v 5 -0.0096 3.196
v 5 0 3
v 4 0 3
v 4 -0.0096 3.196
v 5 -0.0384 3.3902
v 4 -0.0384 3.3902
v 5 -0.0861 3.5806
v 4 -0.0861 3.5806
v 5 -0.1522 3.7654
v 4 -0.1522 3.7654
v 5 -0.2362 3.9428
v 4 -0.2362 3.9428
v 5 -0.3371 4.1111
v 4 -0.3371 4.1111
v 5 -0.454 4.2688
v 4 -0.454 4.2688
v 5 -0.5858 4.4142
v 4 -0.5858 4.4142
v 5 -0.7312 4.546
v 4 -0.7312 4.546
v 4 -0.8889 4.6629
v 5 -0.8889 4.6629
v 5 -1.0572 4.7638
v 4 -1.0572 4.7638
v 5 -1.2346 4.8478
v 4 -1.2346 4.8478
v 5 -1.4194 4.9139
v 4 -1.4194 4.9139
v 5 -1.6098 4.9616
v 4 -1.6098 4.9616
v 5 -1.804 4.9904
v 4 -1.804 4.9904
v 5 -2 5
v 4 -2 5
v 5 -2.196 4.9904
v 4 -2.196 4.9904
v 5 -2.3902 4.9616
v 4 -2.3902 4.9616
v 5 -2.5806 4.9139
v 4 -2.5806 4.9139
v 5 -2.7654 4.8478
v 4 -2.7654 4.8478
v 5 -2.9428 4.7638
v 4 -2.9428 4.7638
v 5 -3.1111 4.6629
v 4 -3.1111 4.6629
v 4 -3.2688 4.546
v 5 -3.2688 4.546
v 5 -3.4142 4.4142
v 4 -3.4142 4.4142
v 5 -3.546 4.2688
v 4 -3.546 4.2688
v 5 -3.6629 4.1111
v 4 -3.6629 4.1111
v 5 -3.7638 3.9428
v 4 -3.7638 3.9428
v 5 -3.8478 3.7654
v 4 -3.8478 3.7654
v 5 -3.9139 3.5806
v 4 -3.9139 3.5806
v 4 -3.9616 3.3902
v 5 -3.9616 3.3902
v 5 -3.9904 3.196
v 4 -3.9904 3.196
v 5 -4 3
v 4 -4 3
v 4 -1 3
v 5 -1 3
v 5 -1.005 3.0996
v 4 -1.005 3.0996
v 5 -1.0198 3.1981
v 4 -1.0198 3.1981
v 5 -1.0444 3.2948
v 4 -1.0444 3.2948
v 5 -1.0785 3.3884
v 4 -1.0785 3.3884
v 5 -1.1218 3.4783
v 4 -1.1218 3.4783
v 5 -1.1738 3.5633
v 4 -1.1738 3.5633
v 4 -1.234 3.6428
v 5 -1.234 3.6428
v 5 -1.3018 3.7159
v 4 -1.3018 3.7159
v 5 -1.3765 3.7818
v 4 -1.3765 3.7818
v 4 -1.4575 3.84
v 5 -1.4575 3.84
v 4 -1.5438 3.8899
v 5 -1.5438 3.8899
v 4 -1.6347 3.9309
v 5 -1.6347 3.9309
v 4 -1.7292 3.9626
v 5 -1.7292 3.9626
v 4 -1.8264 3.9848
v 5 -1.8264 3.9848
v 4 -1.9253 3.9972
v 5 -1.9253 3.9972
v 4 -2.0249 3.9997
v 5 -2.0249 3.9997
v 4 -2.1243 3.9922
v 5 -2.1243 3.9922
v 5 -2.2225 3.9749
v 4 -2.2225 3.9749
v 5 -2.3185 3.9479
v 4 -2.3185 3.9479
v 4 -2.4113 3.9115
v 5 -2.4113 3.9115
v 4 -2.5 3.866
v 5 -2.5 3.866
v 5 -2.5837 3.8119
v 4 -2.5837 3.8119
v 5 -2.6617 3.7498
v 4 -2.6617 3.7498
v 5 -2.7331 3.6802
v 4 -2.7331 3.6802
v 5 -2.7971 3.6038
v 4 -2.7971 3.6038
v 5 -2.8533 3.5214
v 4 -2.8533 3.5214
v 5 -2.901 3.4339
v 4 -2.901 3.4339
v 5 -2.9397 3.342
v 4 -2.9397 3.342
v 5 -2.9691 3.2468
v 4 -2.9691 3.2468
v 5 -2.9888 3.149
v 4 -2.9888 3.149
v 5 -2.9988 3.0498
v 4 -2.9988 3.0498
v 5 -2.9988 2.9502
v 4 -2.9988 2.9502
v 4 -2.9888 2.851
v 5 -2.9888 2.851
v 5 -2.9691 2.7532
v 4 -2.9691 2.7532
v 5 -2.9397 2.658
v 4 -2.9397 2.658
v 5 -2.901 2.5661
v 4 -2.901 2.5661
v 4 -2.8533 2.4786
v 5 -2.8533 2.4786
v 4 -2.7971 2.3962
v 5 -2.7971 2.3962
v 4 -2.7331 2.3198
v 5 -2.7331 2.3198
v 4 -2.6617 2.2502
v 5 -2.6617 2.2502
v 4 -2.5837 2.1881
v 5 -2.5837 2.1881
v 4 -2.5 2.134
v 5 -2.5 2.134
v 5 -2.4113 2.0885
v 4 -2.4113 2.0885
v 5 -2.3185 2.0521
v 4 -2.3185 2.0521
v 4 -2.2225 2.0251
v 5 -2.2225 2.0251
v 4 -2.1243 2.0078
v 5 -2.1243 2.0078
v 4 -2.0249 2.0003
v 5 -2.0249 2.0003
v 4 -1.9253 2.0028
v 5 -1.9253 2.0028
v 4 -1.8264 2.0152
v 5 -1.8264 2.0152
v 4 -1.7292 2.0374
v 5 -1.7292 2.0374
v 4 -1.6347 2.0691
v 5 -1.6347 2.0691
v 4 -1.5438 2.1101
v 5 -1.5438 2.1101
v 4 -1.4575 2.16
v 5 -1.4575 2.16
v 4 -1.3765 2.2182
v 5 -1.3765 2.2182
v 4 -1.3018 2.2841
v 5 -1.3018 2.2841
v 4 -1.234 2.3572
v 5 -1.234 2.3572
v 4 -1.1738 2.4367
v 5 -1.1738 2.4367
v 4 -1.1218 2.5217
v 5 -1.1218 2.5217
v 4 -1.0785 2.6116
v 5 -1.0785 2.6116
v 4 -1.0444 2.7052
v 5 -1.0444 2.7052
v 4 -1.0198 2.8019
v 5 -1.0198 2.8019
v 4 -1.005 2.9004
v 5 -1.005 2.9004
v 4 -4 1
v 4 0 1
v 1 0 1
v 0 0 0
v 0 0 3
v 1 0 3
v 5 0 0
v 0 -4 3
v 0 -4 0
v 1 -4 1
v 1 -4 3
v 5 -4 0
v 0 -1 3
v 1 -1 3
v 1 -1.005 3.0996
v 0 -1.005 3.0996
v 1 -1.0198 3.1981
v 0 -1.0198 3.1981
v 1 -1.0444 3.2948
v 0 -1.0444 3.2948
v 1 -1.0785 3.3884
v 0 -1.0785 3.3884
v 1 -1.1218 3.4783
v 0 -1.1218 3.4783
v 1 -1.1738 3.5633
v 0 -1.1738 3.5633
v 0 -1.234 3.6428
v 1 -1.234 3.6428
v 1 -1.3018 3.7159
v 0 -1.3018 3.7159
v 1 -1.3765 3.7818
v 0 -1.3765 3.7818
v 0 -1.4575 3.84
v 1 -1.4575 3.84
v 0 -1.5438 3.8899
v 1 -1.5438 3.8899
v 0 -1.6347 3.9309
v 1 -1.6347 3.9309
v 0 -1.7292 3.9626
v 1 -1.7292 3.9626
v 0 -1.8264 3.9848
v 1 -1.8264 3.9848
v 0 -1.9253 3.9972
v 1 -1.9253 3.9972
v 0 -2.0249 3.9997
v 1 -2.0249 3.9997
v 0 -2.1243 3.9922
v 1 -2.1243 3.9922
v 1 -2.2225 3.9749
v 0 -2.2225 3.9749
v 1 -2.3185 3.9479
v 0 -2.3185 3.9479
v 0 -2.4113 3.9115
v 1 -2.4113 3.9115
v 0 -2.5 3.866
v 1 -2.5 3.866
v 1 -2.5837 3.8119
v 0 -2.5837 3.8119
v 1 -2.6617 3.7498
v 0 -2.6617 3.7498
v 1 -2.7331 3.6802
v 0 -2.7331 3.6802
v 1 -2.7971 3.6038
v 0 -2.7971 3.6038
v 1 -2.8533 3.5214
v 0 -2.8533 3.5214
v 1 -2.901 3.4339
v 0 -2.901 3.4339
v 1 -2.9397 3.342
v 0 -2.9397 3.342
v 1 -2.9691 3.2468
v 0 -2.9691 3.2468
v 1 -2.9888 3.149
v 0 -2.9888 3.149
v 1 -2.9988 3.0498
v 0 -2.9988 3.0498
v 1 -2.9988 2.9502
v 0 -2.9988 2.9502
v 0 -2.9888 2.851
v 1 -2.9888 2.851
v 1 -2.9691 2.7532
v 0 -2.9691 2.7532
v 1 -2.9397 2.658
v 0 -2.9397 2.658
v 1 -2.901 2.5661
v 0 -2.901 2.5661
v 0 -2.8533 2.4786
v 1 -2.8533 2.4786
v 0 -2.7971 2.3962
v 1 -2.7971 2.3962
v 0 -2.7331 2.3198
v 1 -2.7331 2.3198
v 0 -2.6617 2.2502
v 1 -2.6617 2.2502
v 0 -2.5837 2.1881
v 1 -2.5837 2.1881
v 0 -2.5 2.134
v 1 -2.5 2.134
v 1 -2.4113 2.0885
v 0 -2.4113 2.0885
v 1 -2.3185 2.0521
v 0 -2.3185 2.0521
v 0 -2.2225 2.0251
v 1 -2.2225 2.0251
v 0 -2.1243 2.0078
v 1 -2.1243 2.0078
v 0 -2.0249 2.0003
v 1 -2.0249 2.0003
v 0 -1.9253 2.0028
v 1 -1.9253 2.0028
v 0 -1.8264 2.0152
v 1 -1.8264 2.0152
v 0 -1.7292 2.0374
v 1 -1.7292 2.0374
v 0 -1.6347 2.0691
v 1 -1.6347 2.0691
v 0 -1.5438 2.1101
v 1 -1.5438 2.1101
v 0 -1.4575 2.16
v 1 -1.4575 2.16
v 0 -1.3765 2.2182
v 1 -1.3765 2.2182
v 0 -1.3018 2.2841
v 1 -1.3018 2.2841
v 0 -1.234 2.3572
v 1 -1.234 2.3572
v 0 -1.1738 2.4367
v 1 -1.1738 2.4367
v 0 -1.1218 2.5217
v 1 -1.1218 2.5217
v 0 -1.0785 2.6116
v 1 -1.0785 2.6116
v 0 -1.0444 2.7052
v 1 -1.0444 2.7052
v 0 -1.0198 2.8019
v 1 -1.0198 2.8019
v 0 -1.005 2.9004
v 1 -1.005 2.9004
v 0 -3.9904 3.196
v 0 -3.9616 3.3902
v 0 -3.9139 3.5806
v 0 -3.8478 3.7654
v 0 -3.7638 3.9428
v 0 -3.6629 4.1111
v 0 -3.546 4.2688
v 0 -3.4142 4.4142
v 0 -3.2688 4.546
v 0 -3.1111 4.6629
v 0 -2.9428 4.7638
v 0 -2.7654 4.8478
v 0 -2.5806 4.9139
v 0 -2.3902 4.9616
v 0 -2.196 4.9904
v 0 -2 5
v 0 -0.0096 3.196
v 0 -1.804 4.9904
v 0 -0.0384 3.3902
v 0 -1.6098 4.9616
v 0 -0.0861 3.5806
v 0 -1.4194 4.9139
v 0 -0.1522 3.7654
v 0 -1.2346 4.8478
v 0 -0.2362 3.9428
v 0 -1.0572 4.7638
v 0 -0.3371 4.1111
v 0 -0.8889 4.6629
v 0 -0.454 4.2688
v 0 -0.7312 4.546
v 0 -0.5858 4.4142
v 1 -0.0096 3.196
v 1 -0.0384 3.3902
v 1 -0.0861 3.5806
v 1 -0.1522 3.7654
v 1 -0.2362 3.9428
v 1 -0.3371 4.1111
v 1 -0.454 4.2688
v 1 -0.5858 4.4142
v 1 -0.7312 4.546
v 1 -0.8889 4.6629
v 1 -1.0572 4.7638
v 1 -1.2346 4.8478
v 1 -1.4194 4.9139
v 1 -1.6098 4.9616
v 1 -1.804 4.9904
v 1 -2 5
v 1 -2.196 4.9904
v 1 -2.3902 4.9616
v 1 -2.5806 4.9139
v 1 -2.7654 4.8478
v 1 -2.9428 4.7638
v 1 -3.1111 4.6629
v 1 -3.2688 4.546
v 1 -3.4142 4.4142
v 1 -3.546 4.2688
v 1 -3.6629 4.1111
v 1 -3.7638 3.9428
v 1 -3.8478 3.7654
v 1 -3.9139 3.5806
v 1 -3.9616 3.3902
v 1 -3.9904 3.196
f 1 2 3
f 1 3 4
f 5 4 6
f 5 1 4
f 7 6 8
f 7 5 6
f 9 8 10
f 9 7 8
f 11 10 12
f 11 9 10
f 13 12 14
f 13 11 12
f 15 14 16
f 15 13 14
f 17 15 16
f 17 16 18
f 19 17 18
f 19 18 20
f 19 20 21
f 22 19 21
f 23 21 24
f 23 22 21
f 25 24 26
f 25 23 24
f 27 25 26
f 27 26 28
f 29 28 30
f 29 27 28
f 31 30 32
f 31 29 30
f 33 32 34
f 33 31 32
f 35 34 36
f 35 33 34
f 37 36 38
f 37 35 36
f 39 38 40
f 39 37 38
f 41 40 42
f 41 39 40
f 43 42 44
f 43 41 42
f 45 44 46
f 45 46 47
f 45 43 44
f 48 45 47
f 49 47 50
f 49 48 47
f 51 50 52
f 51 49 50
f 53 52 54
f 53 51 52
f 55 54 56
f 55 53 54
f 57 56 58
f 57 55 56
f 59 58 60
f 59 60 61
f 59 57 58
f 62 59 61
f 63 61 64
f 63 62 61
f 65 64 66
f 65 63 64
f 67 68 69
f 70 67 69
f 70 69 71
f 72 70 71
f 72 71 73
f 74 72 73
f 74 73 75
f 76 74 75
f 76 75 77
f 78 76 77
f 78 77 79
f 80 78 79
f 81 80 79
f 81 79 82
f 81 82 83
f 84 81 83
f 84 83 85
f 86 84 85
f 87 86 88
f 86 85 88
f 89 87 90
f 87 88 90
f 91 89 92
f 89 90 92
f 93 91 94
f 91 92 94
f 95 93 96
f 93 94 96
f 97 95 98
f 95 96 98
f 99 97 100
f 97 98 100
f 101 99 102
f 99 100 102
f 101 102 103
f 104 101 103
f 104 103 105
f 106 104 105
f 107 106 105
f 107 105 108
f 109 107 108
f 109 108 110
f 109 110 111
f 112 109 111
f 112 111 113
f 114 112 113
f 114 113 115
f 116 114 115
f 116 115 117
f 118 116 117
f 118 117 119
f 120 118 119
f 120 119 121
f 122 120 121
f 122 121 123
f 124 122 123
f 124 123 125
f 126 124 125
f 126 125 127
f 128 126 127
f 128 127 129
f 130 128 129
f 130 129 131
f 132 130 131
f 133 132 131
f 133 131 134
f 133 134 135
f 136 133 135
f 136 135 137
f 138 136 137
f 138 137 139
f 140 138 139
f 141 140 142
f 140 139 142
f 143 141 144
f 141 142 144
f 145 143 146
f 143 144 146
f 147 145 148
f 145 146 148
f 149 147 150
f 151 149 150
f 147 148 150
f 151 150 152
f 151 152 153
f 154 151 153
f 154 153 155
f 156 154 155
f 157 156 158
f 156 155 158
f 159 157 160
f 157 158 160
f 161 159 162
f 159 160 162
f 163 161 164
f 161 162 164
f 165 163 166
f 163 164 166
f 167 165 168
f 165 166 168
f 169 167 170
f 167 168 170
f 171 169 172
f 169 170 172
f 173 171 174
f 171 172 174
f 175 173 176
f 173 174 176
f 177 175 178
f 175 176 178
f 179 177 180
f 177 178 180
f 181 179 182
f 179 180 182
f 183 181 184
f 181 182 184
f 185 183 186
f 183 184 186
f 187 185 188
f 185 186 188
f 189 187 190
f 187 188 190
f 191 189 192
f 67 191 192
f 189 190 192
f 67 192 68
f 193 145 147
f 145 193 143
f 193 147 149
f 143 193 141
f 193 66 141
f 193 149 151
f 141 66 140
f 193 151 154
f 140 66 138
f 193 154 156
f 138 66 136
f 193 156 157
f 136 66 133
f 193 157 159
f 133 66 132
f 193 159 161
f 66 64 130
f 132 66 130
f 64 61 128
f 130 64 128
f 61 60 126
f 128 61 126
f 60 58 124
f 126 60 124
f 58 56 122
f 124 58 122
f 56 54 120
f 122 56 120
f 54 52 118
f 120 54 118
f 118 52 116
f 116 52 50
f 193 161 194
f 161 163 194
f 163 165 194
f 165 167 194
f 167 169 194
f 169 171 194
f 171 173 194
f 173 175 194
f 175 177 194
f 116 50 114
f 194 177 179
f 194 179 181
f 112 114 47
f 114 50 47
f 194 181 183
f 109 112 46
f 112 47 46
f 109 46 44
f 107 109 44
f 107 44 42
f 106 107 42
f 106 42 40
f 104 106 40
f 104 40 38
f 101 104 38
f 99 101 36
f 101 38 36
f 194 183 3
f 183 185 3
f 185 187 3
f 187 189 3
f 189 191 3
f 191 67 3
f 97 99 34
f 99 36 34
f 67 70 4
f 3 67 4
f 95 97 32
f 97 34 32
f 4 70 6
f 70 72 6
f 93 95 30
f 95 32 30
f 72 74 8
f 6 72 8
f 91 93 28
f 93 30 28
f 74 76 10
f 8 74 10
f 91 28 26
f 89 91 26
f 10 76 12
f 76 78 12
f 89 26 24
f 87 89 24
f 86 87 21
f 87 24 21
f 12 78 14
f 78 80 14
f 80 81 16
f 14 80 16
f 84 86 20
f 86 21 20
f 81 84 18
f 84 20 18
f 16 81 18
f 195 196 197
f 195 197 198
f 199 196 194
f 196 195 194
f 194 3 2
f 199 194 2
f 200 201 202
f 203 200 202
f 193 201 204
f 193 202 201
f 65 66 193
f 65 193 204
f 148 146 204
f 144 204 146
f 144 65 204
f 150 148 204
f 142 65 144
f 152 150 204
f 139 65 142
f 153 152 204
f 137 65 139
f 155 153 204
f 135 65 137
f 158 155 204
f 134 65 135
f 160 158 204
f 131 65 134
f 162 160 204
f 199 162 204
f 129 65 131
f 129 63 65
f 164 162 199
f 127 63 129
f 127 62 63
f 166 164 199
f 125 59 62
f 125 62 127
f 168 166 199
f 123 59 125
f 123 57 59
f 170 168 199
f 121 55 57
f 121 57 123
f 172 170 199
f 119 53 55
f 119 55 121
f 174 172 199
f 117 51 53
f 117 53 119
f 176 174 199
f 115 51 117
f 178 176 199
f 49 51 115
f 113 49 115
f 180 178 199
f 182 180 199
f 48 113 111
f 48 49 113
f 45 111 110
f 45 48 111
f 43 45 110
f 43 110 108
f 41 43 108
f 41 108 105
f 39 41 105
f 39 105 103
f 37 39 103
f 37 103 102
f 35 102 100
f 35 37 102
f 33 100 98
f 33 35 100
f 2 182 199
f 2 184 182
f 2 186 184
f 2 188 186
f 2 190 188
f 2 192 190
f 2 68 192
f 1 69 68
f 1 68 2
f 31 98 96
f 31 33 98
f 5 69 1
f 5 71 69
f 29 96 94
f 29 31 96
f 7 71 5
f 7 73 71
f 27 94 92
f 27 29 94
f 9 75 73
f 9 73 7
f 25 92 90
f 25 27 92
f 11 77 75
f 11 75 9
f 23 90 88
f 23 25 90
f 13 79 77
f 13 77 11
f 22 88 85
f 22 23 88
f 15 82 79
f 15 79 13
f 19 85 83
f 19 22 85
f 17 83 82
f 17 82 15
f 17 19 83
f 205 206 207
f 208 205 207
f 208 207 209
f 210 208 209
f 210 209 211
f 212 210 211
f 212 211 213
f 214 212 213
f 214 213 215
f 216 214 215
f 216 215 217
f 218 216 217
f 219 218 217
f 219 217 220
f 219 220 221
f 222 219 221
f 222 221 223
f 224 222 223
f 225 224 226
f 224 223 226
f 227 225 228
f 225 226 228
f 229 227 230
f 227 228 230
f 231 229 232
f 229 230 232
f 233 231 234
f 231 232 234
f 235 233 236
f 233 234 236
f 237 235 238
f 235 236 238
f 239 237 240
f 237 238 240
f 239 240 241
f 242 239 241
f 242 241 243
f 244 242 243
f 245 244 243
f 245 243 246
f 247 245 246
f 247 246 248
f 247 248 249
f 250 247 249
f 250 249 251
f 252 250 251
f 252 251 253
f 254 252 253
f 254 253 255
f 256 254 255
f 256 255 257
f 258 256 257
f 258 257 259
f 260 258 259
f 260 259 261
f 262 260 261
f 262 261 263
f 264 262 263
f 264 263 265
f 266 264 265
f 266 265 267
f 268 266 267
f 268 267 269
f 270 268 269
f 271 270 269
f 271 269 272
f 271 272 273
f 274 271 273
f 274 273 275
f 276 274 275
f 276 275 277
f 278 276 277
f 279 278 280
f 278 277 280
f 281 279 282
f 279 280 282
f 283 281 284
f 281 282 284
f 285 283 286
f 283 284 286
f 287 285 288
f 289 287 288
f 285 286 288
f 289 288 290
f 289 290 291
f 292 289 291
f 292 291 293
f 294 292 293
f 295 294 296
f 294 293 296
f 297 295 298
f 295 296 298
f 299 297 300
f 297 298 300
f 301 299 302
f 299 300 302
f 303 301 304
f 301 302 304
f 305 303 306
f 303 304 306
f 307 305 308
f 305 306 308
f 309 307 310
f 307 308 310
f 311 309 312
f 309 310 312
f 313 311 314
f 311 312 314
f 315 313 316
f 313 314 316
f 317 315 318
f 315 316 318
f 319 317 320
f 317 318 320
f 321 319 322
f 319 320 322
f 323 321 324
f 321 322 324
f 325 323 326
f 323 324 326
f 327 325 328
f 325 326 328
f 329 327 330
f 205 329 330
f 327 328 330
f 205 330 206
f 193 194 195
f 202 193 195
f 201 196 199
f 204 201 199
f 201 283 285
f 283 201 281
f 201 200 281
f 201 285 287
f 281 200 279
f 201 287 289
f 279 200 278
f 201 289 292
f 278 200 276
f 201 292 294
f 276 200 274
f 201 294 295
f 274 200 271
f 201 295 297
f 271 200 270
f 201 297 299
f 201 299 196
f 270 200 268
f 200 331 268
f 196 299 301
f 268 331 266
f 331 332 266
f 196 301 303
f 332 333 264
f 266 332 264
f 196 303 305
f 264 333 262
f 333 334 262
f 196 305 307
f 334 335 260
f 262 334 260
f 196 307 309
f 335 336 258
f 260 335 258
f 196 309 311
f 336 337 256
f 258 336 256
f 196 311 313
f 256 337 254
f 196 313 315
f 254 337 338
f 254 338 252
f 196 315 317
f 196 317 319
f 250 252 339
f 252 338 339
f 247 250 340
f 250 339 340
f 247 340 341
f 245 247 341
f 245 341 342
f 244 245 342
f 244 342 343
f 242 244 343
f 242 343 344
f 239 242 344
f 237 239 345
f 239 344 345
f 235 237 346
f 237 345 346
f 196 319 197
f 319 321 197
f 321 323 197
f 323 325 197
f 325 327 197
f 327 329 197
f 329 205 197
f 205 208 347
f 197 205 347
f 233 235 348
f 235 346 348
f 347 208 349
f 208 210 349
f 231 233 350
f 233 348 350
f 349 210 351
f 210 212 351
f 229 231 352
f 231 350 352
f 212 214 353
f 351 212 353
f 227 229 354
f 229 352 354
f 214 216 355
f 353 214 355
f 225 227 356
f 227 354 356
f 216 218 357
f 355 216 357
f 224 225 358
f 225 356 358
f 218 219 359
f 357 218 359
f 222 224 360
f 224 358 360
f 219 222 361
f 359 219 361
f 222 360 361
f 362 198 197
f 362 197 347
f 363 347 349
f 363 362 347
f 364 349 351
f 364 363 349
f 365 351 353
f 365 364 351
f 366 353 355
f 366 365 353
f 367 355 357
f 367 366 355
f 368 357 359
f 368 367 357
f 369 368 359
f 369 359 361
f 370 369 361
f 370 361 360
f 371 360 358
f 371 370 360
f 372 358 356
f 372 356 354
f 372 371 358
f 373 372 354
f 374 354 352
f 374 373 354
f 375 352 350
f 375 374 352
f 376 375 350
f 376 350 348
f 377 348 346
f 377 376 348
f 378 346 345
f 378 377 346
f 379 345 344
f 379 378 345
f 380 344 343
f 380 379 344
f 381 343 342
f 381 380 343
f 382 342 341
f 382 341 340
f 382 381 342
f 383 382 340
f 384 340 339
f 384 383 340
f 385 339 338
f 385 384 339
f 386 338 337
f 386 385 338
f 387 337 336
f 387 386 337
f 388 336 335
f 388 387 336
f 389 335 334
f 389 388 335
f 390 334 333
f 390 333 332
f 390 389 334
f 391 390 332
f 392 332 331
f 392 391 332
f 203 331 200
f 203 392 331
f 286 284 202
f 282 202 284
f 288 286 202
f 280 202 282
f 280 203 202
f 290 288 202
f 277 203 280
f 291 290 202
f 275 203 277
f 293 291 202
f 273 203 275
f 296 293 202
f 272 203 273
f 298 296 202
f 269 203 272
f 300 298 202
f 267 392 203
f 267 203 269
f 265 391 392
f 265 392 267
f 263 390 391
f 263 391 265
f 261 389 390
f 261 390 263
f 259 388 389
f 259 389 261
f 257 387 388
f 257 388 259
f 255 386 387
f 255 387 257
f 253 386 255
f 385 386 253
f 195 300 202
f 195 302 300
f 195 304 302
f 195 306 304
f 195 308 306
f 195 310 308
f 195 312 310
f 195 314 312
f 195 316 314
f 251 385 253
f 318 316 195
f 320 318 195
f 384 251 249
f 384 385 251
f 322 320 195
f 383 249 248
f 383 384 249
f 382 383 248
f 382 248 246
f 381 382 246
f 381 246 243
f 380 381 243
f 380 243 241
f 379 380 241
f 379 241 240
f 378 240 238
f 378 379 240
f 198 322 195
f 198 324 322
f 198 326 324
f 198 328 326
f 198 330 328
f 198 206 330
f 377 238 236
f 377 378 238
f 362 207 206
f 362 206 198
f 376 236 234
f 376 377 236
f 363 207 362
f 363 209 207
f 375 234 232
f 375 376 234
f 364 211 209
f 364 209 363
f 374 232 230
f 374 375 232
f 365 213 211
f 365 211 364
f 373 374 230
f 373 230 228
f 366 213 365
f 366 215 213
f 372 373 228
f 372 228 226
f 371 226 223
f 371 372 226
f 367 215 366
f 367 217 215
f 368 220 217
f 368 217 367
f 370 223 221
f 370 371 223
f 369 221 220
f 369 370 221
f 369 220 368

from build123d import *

# Parameters (mm, degrees)
F1_DEPTH = 4
F3_DEPTH = 1
F5_DEPTH = 1
F6_R     = 1
F7_DEPTH = 6


with BuildPart() as f1:
    # F0 (on Front) → F1 (new body)
    with BuildSketch(Plane.XZ):
        Polygon((0, 3), (0, 0), (5, 0), (5, 3), (4, 3), (4, 1), (1, 1), (1, 3), align=None)
    extrude(amount=F1_DEPTH)

    # F2 (on face) → F3 (join)
    with BuildSketch(Plane.YZ.offset(1)):
        with BuildLine():
            Line((-4, 3), (0, 3))
            ThreePointArc((0, 3), (-2, 5), (-4, 3))
        make_face()
    extrude(amount=-F3_DEPTH)

    # F4 (on face) → F5 (join)
    with BuildSketch(Plane.YZ.offset(5)):
        with BuildLine():
            Line((-4, 3), (0, 3))
            ThreePointArc((0, 3), (-2, 5), (-4, 3))
        make_face()
    extrude(amount=-F5_DEPTH)

    # F6 (on face) → F7 (cut)
    with BuildSketch(Plane.YZ.offset(5)):
        with Locations((-2, 3)):
            Circle(F6_R)
    extrude(amount=-F7_DEPTH, mode=Mode.SUBTRACT)


solid = f1.part
